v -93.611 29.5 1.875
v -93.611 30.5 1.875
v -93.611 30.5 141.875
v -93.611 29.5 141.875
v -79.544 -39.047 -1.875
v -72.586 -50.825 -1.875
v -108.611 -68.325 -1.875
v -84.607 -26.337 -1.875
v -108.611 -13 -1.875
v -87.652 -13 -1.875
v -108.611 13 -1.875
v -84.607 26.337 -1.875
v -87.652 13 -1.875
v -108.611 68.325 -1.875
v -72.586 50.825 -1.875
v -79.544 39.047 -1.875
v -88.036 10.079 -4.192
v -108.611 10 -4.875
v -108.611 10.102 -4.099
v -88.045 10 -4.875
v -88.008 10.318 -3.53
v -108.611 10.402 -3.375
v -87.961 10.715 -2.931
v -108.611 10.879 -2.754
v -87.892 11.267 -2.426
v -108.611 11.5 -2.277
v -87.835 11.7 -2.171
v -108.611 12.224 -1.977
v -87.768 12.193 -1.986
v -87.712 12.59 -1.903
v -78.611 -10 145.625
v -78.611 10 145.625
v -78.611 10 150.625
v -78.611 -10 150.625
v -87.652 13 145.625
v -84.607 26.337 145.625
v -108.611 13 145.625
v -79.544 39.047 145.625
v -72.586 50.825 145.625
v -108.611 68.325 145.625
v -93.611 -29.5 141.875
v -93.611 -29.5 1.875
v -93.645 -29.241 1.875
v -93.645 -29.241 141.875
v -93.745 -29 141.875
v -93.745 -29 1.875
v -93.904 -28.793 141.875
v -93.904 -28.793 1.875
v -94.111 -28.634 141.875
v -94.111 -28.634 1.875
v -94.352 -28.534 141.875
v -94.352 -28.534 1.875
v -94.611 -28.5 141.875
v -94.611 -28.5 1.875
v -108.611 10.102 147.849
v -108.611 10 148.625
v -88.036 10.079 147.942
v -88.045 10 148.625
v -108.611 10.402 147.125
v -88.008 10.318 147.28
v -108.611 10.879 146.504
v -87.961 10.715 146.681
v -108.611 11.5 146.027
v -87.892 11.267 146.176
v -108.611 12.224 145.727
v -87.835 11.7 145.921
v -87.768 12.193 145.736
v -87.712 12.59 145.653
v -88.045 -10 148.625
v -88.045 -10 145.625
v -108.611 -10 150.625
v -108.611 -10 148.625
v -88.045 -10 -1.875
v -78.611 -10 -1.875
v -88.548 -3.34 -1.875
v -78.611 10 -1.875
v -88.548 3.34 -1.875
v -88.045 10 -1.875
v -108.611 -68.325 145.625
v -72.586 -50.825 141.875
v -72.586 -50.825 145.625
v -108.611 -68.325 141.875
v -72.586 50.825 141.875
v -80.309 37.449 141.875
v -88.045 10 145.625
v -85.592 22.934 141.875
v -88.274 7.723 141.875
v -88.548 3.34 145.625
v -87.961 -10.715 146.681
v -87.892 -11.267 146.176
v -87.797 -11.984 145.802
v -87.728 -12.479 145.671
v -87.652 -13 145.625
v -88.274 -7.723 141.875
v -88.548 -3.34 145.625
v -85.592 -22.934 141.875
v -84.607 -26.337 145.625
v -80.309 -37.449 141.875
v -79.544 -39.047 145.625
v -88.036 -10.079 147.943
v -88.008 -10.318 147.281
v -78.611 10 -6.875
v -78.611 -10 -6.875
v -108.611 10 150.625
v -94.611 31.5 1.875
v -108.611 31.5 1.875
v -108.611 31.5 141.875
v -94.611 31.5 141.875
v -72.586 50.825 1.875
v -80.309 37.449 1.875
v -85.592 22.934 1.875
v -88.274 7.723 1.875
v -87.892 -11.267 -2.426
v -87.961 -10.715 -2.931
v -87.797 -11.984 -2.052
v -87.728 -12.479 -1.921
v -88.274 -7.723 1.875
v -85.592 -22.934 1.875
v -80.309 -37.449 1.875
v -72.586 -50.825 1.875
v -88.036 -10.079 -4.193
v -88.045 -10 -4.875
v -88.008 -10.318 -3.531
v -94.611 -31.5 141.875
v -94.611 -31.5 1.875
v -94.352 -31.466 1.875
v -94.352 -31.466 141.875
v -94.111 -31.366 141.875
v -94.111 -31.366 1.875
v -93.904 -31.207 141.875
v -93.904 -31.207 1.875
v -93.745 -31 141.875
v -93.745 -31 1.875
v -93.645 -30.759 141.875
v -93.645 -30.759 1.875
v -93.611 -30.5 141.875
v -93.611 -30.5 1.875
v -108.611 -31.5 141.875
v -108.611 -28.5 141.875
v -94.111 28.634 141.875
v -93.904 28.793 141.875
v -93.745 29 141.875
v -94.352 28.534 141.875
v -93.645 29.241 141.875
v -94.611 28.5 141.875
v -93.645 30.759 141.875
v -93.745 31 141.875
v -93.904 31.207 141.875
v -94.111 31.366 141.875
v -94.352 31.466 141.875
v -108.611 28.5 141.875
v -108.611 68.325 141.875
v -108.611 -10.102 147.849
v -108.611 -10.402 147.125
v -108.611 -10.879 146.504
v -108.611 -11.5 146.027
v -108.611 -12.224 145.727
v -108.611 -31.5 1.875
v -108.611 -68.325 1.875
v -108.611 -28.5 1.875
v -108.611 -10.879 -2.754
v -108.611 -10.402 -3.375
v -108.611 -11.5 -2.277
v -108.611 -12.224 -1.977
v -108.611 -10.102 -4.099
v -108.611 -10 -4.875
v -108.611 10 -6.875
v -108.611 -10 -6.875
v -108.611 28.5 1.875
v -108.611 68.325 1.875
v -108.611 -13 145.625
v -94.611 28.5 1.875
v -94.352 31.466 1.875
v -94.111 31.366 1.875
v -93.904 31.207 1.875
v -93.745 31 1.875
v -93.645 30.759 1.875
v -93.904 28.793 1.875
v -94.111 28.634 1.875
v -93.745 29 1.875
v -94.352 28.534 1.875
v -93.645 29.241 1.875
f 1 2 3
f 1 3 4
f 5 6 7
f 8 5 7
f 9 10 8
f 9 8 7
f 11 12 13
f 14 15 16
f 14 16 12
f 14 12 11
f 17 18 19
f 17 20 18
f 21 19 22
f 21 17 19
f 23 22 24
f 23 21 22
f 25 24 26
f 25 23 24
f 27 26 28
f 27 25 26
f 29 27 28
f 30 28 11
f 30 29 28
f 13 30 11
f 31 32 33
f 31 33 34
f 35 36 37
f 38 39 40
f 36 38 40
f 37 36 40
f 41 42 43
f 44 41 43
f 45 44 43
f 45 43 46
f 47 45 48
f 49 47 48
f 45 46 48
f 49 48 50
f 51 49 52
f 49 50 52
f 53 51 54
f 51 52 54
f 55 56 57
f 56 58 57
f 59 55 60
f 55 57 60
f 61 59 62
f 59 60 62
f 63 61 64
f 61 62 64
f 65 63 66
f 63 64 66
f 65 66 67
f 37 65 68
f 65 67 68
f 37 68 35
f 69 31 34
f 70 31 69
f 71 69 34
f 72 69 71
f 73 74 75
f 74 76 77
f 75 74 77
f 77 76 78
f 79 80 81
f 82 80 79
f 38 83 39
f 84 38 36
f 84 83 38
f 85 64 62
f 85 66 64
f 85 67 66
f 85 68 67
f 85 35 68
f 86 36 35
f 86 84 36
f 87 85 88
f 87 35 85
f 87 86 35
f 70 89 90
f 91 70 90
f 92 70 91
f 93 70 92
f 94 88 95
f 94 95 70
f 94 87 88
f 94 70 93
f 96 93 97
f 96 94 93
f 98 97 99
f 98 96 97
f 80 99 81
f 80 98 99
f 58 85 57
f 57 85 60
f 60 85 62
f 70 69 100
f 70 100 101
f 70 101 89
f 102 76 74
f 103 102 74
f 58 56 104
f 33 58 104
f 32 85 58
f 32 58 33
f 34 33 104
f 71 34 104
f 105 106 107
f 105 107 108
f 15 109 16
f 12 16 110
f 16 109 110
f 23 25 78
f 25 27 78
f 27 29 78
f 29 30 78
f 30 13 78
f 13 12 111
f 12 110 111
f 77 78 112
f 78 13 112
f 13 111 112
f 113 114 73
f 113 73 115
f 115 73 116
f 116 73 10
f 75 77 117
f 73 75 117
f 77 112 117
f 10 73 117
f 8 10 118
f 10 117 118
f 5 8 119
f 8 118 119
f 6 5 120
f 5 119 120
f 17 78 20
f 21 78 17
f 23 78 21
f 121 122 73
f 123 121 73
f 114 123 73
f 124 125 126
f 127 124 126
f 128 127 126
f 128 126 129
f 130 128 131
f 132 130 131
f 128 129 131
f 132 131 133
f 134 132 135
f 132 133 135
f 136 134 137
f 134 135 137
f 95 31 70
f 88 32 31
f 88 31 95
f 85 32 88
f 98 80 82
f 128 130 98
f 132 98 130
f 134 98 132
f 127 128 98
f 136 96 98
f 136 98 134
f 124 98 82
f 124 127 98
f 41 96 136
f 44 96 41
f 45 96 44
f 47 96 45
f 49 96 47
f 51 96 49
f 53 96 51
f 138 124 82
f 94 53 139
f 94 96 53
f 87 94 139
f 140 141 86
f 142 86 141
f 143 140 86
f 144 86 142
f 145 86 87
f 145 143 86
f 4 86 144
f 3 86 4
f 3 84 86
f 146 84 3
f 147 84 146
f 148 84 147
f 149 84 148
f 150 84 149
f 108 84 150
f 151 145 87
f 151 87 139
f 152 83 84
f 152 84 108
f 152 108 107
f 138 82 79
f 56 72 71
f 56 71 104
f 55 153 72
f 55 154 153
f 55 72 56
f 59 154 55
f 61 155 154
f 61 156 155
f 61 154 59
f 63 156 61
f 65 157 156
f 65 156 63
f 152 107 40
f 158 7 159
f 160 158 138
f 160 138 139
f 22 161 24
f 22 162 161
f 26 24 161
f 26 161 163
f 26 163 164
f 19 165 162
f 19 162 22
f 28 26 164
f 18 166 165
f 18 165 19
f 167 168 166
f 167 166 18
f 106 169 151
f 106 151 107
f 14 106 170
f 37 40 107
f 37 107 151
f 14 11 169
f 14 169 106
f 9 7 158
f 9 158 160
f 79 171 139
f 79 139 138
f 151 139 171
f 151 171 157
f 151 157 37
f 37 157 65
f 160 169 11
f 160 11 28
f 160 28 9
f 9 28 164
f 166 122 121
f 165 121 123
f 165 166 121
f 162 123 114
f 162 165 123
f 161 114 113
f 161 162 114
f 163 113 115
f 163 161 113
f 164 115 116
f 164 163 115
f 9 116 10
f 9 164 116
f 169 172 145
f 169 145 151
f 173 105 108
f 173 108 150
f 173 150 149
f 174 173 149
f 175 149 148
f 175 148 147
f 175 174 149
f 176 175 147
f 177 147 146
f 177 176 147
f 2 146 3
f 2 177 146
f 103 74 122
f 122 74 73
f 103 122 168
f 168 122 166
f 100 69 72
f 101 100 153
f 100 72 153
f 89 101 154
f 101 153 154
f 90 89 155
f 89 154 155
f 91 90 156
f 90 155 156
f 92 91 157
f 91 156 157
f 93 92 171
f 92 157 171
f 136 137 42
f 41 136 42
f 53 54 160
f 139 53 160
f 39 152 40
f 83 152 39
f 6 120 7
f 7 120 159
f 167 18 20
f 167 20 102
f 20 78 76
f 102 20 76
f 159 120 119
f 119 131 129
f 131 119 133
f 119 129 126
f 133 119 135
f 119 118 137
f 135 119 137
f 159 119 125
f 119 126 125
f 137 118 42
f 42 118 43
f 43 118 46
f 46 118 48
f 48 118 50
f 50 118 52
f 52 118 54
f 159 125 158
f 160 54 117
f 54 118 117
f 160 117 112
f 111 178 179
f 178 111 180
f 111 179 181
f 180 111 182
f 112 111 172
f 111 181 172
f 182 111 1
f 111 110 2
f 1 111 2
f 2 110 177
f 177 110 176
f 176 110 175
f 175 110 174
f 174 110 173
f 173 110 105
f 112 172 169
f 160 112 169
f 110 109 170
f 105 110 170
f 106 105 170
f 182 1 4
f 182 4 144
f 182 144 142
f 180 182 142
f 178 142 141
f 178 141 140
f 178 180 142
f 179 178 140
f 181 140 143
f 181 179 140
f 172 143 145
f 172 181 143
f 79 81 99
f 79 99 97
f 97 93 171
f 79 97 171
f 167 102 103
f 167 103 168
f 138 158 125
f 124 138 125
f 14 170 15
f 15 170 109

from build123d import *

# Parameters (mm, degrees)
BOSS_EXTRUDE1_DEPTH = 1.875
BOSS_EXTRUDE3_DEPTH = 140
BOSS_EXTRUDE4_DEPTH = 5
FILLET4_R           = 3


with BuildPart() as part:
    # Sketch1 → Boss-Extrude1 (new body, symmetric)
    with BuildSketch(Plane.XY):
        with BuildLine():
            Line((-72.585877034, -50.825178267), (-108.610994186, -68.325178267))
            Line((-108.610994186, -68.325178267), (-108.610994186, 68.325178267))
            Line((-108.610994186, 68.325178267), (-72.585877034, 50.825178267))
            ThreePointArc((-72.585877034, 50.825178267), (-88.610994186, 0), (-72.585877034, -50.825178267))
        make_face()
    boss_extrude1 = extrude(amount=BOSS_EXTRUDE1_DEPTH, both=True)

    # Sketch3 → Boss-Extrude3 (add)
    with BuildSketch(Plane.XY.offset(1.875)):
        with BuildLine():
            Line((-108.610994186, -28.5), (-108.610994186, -31.5))
            Line((-108.610994186, -31.5), (-94.610994186, -31.5))
            ThreePointArc((-94.610994186, -31.5), (-93.903887405, -31.207106781), (-93.610994186, -30.5))
            Line((-93.610994186, -30.5), (-93.610994186, -29.5))
            ThreePointArc((-93.610994186, -29.5), (-93.903887405, -28.792893219), (-94.610994186, -28.5))
            Line((-94.610994186, -28.5), (-108.610994186, -28.5))
        make_face()
    boss_extrude3 = extrude(amount=BOSS_EXTRUDE3_DEPTH)

    # Mirror2: Boss-Extrude3 across plane
    add(boss_extrude3.mirror(Plane.ZX))

    # Mirror7: Boss-Extrude1 across plane
    add(boss_extrude1.mirror(Plane.XY.offset(71.875)))

    # Sketch4 → Boss-Extrude4 (add)
    with BuildSketch(Plane(origin=(0, 0, -1.875), x_dir=(-1, 0, 0), z_dir=(0, 0, -1))):
        Polygon((108.610994186, 0), (108.610994186, 10), (78.610994186, 10), (78.610994186, -10), (108.610994186, -10), align=None)
    boss_extrude4 = extrude(amount=BOSS_EXTRUDE4_DEPTH)

    # Mirror10: Boss-Extrude4 across plane
    add(boss_extrude4.mirror(Plane.XY.offset(71.875)))

    # Fillet4
    fillet4_edges = [part.edges().sort_by_distance(p)[0] for p in [
        (-98.327958095, -10, -1.875),
        (-98.327958095, 10, -1.875),
        (-98.327958095, -10, 145.625),
        (-98.327958095, 10, 145.625),
    ]]
    fillet(fillet4_edges, radius=FILLET4_R)


solid = part.part
